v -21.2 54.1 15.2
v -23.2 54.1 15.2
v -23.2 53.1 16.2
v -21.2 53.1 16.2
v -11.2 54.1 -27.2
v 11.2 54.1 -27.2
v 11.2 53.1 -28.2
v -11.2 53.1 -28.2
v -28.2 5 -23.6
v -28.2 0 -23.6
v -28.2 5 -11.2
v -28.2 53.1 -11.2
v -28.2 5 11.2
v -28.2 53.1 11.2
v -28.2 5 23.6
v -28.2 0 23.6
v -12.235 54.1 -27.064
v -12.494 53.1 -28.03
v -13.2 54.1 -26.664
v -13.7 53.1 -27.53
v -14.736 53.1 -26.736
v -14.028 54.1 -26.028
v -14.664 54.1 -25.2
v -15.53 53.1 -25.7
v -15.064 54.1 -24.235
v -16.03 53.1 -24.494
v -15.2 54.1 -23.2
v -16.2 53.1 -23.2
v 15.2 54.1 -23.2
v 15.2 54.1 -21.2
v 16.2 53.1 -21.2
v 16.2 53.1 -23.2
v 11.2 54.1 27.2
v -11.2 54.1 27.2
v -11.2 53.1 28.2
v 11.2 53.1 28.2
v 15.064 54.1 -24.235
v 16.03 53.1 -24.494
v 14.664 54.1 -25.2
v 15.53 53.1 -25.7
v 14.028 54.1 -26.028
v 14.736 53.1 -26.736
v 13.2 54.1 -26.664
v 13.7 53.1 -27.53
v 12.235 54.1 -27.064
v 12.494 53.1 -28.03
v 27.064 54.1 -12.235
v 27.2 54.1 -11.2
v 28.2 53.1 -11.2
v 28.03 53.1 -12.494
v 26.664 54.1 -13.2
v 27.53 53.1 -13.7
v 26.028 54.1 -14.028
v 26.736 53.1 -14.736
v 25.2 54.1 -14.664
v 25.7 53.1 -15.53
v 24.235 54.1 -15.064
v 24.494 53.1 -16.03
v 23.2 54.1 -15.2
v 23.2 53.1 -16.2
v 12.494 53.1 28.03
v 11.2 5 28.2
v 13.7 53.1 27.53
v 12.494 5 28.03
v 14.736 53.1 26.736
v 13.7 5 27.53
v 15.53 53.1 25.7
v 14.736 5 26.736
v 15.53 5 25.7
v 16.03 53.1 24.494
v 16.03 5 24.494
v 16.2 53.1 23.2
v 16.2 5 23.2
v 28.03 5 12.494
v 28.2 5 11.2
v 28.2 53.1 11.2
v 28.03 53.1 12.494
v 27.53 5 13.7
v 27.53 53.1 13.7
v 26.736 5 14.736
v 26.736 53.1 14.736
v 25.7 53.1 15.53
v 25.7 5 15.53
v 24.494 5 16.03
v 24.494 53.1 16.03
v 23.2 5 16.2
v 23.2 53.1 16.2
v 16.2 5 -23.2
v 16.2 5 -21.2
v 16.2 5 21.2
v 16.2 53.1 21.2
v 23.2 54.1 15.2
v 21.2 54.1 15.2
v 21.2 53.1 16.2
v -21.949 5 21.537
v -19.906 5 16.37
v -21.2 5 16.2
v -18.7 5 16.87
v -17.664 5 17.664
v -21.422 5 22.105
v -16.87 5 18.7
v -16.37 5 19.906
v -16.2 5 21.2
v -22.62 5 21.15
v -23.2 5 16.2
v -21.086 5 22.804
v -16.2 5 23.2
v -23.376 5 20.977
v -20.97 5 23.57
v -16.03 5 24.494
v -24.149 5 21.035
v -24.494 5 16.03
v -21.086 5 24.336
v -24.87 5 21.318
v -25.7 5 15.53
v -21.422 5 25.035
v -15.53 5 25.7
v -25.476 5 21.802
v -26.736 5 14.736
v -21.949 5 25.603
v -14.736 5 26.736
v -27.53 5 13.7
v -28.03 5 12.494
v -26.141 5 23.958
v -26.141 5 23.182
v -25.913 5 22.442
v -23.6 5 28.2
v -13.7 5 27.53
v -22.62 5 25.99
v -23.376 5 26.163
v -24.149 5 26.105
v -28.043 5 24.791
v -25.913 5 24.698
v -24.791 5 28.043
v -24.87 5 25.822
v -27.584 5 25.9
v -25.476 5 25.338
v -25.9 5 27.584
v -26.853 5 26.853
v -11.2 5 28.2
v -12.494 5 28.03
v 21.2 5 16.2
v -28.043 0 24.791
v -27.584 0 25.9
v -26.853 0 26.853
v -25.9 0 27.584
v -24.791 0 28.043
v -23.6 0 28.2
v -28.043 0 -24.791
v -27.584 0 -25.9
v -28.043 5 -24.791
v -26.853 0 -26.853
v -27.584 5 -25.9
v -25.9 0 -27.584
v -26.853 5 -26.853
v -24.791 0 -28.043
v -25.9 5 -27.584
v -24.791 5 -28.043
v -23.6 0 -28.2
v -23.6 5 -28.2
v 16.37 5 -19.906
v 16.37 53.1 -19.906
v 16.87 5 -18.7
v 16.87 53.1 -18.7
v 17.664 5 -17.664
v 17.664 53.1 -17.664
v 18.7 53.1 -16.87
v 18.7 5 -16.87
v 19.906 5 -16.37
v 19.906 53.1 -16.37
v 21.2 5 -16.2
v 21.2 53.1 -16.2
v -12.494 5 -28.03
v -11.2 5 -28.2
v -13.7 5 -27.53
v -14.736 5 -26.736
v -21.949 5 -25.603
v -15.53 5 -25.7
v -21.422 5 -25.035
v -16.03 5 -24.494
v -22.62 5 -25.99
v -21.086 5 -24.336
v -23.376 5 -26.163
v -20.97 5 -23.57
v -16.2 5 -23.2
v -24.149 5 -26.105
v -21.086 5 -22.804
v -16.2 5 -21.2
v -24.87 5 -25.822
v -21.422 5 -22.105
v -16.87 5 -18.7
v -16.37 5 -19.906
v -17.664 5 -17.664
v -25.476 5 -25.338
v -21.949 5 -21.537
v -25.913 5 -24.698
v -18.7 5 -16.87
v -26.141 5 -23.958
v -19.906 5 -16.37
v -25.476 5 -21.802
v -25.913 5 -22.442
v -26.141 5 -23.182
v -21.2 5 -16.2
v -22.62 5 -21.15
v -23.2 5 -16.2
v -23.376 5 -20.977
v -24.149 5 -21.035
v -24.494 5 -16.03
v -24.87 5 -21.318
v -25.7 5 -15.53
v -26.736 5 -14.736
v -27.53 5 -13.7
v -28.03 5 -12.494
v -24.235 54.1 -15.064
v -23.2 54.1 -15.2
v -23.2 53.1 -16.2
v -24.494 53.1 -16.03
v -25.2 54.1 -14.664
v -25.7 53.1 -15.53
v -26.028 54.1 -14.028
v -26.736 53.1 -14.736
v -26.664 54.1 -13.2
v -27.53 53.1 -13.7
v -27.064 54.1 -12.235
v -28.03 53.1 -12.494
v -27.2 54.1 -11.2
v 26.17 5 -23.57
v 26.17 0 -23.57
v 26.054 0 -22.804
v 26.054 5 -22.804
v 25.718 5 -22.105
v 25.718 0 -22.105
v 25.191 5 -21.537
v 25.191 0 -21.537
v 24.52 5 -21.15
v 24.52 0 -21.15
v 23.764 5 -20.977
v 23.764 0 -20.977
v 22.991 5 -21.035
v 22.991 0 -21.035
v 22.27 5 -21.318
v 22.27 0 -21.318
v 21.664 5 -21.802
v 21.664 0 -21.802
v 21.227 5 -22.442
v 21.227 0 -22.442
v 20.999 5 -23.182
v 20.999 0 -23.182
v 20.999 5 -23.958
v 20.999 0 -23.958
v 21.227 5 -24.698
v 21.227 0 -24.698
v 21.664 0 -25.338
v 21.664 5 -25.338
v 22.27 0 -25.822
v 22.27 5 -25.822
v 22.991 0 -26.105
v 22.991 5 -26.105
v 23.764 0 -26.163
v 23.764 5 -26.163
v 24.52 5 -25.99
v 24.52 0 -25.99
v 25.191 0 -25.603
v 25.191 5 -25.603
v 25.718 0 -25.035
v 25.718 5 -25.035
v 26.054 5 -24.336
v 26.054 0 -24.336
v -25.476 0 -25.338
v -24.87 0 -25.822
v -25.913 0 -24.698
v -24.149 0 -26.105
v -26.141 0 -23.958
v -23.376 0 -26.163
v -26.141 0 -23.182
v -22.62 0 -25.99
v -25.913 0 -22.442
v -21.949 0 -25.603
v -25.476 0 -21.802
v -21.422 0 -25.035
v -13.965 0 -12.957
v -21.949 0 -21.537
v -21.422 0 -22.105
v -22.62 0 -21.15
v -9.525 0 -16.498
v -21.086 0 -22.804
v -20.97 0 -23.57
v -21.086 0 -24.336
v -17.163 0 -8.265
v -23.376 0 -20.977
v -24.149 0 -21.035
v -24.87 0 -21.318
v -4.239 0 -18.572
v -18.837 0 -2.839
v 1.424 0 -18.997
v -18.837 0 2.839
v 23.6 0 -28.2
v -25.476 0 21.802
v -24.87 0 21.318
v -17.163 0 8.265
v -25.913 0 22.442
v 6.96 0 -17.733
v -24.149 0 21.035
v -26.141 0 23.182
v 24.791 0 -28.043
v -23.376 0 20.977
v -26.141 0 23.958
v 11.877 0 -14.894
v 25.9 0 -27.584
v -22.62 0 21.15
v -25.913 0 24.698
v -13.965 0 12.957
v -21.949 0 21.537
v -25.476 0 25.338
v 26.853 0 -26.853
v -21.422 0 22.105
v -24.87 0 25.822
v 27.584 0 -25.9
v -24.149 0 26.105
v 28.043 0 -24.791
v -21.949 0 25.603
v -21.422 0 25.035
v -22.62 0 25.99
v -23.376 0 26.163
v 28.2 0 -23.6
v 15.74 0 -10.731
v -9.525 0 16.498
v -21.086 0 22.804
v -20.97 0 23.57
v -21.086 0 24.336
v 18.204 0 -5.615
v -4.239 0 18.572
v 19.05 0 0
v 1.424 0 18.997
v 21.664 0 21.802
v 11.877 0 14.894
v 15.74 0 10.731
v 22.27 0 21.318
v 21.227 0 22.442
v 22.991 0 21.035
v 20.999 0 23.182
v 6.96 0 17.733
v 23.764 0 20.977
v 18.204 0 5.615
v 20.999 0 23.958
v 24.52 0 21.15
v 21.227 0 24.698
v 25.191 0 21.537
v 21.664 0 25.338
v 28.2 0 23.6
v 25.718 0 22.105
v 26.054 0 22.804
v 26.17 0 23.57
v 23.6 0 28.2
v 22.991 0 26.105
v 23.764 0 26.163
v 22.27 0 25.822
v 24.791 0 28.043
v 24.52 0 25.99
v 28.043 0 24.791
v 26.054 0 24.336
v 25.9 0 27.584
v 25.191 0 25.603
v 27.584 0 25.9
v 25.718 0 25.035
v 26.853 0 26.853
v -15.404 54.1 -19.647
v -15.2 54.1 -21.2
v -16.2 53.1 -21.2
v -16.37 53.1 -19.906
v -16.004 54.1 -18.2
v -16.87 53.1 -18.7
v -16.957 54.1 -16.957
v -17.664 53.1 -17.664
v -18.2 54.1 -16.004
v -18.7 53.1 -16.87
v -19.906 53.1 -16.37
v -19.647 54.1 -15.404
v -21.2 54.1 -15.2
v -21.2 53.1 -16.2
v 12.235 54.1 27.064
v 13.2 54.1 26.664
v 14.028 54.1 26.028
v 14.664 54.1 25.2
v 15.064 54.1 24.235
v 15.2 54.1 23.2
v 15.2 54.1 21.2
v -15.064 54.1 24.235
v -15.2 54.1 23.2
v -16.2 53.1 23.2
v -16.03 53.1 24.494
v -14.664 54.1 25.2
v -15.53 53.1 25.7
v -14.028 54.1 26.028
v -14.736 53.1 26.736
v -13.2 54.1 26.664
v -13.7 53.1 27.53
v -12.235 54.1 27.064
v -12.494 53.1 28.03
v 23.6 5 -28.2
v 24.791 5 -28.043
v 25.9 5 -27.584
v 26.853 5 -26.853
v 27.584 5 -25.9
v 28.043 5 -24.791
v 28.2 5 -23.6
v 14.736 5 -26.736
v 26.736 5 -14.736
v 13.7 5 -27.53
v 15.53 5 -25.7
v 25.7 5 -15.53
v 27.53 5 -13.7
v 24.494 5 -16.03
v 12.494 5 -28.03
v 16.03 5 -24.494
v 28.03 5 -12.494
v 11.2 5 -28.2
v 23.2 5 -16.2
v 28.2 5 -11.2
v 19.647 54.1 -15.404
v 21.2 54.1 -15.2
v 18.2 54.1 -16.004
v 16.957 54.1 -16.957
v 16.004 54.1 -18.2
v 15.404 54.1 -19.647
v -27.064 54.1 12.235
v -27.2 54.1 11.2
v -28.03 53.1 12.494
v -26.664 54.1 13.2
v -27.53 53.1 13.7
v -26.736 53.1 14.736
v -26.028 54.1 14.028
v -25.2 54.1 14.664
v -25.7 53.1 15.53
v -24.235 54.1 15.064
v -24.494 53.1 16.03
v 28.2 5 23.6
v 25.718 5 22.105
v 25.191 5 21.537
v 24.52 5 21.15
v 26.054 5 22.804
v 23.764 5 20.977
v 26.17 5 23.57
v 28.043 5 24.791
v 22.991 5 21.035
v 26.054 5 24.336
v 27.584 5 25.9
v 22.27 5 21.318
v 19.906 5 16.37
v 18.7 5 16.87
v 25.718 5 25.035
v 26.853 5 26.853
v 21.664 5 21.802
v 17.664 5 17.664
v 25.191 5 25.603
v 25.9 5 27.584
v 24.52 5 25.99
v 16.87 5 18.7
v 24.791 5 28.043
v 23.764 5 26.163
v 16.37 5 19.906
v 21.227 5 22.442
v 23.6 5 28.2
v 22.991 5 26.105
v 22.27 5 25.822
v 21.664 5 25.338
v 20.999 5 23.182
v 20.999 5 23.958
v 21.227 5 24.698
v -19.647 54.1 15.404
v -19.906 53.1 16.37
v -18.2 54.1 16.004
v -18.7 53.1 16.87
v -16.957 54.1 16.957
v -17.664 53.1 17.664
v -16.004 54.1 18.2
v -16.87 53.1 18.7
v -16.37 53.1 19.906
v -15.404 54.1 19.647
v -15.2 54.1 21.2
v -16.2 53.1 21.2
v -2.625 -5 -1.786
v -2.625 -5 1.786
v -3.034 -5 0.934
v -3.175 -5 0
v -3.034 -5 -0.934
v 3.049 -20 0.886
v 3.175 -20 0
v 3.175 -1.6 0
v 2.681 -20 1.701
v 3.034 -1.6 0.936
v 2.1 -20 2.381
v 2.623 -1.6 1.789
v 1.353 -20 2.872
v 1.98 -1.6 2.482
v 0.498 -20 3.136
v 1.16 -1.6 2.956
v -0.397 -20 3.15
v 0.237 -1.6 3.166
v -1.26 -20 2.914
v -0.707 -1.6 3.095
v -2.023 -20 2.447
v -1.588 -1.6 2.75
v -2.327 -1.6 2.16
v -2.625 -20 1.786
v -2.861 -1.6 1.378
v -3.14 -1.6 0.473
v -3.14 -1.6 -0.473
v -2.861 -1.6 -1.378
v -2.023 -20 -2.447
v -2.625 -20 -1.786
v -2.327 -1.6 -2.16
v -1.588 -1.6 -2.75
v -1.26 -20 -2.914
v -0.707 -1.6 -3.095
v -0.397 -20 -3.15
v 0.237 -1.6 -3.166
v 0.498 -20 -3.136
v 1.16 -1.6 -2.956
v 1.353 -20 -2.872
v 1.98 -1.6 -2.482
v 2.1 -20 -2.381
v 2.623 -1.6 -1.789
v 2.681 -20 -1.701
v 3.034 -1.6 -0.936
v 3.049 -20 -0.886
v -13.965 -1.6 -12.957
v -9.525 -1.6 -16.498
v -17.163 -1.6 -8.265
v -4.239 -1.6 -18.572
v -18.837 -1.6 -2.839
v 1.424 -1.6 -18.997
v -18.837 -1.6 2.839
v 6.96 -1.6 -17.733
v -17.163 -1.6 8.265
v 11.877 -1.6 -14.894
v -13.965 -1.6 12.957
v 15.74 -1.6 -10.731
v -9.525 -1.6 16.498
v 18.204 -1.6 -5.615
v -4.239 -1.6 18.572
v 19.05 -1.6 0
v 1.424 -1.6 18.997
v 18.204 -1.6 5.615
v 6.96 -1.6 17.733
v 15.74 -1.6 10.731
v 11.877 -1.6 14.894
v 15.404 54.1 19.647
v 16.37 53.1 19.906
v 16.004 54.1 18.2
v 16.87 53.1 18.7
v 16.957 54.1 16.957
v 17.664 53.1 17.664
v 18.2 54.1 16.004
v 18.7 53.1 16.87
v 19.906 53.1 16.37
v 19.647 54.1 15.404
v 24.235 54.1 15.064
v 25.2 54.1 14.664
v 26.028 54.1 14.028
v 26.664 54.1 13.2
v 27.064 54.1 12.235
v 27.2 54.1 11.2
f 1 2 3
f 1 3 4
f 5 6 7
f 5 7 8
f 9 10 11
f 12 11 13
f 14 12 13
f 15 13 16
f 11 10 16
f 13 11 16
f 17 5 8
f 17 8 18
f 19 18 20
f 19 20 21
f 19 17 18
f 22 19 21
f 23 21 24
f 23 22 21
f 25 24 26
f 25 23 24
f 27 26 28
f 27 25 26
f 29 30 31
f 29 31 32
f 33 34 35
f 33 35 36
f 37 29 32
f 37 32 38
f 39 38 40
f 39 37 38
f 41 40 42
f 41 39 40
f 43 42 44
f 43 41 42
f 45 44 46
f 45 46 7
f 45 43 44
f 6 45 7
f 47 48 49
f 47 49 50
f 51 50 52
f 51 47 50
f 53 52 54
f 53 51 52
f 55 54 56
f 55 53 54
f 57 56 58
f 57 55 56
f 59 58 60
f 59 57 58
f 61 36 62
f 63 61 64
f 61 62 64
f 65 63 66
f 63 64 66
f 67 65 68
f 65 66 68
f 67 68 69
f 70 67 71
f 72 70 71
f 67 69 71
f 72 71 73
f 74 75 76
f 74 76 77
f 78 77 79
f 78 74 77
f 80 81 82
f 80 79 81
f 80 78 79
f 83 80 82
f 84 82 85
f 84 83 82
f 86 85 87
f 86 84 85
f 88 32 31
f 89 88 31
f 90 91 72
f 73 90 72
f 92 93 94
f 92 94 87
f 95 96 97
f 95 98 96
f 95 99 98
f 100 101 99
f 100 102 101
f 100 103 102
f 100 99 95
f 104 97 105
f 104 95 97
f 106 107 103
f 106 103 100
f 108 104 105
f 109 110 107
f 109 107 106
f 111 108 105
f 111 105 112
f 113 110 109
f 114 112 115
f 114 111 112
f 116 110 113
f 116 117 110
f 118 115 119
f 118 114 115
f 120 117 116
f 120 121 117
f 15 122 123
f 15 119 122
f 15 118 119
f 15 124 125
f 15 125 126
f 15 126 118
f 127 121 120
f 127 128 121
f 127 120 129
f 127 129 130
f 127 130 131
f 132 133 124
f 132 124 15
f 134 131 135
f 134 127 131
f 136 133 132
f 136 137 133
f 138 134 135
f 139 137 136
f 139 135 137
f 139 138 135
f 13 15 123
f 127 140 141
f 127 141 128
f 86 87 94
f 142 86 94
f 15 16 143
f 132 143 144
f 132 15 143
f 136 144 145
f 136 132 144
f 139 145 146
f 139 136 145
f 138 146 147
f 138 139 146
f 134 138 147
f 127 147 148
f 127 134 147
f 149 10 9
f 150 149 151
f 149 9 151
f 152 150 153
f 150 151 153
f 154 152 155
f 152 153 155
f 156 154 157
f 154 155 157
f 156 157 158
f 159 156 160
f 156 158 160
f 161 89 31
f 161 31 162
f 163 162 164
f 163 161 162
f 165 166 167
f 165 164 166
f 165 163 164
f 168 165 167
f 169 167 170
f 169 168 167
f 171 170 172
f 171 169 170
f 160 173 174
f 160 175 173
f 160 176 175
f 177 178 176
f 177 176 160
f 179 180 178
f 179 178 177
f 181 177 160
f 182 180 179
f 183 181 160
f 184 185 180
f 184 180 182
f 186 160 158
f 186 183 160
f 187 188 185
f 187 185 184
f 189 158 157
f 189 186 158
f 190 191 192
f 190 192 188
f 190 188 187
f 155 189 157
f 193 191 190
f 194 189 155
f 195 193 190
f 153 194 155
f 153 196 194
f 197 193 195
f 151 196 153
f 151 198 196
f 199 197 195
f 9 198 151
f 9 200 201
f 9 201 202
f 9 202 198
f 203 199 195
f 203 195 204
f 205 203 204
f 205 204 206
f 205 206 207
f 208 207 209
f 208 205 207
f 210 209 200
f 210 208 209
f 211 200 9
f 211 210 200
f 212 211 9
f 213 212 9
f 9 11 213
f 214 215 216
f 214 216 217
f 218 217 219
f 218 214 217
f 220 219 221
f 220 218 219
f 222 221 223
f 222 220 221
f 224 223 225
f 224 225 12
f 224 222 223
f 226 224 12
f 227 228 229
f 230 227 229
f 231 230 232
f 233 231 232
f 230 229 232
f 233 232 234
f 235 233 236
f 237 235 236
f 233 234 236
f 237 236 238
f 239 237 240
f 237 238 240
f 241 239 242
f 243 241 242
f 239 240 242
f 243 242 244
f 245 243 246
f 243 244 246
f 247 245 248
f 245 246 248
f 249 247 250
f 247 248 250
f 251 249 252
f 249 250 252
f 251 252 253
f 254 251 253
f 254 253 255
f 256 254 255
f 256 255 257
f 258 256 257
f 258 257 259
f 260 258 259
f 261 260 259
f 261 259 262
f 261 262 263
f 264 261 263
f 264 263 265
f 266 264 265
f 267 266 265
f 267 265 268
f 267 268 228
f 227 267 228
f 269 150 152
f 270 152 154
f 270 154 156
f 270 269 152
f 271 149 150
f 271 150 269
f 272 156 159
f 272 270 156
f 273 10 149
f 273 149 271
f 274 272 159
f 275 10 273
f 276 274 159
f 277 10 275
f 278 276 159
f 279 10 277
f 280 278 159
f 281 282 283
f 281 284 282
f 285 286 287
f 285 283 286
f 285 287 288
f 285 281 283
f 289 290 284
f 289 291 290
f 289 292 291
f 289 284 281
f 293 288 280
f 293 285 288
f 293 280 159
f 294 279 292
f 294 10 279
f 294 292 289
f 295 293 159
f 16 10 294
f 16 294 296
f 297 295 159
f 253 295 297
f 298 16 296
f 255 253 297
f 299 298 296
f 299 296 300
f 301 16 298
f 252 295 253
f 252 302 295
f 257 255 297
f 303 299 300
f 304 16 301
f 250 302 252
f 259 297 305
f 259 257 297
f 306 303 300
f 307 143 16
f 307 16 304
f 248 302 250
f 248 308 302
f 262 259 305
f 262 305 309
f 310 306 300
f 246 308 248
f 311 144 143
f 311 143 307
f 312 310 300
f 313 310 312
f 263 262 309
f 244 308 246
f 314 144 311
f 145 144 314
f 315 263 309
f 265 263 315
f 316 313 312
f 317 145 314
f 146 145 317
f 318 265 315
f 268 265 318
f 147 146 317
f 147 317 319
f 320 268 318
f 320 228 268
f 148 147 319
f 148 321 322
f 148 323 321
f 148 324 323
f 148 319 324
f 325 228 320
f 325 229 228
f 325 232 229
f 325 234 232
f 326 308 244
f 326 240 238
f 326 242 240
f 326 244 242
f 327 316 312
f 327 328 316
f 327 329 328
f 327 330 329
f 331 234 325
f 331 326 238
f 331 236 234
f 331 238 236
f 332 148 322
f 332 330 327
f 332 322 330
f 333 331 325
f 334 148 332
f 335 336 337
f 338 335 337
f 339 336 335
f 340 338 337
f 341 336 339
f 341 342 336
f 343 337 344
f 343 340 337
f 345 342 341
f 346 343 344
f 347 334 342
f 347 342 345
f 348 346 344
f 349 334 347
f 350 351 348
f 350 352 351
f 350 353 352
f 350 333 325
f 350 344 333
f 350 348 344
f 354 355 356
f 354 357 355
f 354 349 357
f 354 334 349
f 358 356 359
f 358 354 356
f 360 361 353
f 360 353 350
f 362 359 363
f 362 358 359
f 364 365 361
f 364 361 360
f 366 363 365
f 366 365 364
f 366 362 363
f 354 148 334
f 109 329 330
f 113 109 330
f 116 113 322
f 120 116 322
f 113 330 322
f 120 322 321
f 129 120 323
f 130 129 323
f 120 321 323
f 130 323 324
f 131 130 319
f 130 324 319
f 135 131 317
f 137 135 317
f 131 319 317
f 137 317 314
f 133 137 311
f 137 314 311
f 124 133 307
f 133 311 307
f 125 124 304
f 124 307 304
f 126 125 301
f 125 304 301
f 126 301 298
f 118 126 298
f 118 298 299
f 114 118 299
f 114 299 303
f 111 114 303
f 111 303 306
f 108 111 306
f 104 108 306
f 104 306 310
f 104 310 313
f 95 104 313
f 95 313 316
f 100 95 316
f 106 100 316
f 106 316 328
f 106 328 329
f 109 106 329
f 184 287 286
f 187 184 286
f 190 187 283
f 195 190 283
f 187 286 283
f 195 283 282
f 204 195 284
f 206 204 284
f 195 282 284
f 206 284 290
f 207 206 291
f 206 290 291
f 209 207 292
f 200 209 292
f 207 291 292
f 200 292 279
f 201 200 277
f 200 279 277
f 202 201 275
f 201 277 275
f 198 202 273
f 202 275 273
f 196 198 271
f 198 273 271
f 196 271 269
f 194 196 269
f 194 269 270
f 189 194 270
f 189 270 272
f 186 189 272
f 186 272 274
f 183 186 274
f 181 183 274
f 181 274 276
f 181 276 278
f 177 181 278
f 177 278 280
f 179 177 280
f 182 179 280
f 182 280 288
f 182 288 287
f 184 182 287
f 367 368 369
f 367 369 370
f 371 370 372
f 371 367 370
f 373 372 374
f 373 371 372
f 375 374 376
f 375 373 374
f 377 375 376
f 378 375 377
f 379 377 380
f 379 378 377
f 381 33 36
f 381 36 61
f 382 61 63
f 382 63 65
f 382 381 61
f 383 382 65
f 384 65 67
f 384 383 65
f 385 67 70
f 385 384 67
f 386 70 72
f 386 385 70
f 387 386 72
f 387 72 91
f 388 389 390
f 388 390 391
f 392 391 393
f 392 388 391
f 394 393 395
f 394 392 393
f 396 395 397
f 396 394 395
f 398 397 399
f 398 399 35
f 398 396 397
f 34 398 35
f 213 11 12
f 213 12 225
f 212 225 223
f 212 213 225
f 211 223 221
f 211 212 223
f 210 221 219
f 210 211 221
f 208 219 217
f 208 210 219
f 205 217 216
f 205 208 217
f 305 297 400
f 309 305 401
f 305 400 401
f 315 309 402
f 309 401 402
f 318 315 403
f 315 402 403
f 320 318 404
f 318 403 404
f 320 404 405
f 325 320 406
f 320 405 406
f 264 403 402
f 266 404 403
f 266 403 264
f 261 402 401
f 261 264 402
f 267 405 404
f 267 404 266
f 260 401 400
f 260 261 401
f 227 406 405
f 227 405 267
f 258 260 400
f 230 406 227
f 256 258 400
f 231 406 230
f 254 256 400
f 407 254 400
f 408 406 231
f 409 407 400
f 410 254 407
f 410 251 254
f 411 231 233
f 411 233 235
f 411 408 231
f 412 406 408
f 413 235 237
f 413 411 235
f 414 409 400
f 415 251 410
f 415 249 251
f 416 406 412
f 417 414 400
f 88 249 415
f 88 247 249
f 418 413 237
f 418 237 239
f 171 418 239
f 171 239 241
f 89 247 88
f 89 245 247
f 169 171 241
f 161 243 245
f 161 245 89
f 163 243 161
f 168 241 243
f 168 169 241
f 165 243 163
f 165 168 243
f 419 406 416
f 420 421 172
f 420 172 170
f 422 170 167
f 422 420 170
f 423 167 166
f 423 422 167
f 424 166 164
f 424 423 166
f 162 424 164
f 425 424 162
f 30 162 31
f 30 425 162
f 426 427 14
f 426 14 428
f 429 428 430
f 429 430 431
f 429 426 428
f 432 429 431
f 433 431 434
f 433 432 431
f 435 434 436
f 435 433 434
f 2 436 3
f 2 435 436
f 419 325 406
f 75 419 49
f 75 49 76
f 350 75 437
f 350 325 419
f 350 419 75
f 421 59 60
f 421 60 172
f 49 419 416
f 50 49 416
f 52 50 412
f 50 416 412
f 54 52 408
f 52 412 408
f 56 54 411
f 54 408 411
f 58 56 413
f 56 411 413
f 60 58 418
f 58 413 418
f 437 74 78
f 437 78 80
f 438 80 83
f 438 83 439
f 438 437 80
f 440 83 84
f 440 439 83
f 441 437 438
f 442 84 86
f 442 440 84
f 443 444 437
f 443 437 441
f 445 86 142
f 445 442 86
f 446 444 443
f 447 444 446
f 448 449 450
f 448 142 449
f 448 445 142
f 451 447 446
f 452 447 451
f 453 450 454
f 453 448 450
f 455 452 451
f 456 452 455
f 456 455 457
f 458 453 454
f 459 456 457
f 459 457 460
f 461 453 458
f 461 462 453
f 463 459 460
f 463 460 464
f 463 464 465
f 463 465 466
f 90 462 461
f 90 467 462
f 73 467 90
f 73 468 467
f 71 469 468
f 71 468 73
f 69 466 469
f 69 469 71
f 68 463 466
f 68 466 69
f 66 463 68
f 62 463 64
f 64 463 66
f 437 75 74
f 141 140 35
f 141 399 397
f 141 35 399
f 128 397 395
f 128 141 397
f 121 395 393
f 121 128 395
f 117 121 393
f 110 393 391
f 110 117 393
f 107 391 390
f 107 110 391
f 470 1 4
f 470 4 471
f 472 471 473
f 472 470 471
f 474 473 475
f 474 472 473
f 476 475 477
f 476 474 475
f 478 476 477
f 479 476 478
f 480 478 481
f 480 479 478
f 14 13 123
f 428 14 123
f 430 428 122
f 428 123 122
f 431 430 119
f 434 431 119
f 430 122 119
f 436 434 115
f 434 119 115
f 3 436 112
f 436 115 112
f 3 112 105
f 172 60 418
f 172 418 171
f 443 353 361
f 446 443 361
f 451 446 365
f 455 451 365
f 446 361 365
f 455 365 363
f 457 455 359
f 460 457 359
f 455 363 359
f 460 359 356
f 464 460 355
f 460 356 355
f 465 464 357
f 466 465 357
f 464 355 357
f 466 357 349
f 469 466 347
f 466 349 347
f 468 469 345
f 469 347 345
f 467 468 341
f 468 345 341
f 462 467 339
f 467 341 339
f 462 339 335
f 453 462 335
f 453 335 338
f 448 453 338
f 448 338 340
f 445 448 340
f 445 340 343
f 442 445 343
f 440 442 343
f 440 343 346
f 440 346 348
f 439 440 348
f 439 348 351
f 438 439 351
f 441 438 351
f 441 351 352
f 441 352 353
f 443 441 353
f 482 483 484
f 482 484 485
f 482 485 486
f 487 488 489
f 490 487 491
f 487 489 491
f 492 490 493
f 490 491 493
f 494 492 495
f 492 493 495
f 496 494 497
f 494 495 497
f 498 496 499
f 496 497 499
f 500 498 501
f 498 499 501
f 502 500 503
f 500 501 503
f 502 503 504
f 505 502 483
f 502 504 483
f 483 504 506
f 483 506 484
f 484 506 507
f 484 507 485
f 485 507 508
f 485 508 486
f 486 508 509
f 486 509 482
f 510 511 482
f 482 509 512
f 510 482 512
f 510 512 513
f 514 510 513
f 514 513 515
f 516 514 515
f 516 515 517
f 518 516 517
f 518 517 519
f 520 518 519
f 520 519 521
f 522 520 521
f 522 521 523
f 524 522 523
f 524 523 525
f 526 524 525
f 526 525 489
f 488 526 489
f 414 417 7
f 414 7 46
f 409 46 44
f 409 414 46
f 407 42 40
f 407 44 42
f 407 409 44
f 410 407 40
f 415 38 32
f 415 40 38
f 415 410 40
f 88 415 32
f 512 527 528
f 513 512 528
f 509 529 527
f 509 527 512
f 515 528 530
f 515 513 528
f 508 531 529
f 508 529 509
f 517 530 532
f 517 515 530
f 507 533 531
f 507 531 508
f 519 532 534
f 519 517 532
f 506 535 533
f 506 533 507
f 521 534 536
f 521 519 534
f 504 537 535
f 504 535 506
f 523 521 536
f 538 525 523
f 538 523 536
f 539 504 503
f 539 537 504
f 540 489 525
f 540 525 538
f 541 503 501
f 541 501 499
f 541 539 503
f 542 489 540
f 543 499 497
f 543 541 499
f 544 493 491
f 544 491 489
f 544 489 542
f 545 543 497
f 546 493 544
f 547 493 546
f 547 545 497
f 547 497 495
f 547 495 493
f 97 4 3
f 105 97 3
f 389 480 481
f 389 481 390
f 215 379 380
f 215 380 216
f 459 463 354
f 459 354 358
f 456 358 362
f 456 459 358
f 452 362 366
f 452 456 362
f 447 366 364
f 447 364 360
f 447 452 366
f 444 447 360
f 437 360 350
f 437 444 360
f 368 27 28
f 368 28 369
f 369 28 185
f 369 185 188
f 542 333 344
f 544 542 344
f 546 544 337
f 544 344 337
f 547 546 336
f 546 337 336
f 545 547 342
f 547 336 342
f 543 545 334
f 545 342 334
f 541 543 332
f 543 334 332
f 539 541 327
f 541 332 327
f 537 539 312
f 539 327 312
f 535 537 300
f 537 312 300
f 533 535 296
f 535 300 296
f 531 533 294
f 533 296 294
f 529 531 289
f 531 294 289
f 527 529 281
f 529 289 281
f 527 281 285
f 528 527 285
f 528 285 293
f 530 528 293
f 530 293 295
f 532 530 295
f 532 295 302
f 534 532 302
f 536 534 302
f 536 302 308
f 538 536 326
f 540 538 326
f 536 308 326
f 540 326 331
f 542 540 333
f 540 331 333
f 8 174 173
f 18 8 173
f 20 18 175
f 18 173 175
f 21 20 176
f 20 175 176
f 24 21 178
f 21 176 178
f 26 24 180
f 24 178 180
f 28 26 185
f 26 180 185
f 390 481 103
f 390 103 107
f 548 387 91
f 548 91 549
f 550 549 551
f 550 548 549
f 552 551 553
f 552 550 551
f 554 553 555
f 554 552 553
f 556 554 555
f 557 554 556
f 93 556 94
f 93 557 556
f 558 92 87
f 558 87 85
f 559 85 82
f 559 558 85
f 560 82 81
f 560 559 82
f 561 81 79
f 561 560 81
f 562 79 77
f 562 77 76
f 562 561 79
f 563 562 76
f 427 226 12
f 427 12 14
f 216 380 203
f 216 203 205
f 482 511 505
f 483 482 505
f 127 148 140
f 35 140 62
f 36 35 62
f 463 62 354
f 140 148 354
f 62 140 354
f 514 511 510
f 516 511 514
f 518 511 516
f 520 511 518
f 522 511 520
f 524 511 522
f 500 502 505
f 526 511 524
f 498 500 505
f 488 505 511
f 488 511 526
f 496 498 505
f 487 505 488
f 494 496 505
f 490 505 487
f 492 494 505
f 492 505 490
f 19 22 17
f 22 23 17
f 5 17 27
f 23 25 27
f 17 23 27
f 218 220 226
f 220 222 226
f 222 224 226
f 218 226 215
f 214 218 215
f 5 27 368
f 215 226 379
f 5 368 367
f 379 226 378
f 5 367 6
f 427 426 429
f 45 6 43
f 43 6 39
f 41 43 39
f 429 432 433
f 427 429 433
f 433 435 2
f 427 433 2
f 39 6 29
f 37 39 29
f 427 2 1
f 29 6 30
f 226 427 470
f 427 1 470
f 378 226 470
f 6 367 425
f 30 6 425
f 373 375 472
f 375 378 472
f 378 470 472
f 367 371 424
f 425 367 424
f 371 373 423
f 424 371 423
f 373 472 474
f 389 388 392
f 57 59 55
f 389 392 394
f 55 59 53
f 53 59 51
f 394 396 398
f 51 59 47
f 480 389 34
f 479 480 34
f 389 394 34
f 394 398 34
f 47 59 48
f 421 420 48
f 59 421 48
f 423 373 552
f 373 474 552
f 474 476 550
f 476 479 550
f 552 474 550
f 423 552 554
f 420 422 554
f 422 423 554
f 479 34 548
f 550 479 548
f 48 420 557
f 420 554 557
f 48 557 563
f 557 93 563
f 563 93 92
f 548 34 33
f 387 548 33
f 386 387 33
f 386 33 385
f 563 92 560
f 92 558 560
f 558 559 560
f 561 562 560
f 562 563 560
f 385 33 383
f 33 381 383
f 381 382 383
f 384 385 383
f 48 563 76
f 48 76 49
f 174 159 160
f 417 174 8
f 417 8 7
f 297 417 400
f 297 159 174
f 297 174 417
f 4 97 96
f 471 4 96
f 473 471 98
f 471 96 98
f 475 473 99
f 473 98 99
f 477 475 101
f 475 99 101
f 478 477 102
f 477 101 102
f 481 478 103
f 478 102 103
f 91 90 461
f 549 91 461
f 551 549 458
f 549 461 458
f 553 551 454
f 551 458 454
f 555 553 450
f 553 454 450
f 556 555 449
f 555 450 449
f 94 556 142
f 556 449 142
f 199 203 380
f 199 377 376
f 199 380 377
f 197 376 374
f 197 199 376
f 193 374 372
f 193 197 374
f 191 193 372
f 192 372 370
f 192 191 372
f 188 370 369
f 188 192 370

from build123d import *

# Parameters (mm, degrees)
F0_W      = 56.4
F0_H      = 56.4
F1_DEPTH  = 54.1
F2_R      = 19.05
F3_DEPTH  = 1.6
F4_R      = 3.175
F5_DEPTH  = 20
F6_R      = 2.6
F7_DEPTH  = 54.101
F9_DEPTH  = 15
F10_R     = 4.6
F11_W     = 12
F11_H     = 12
F12_DEPTH = 49.1
F13_R     = 5
F14_SIZE  = 1


with BuildPart() as f1:
    # F0 (on Front) → F1 (new body)
    with BuildSketch(Plane.XZ):
        Rectangle(F0_W, F0_H)
    extrude(amount=-F1_DEPTH)

    # F2 (on face) → F3 (join)
    with BuildSketch(Plane.XZ):
        Circle(F2_R)
    extrude(amount=F3_DEPTH)

    # F4 (on face) → F5 (join)
    with BuildSketch(Plane.XZ):
        Circle(F4_R)
    extrude(amount=F5_DEPTH)

    # F6 (on face) → F7 (cut, through all)
    with BuildSketch(Plane.XZ):
        with Locations((23.57, 23.57)):
            Circle(F6_R)
        with Locations((-23.57, 23.57)):
            Circle(F6_R)
        with Locations((23.57, -23.57)):
            Circle(F6_R)
        with Locations((-23.57, -23.57)):
            Circle(F6_R)
    extrude(amount=-F7_DEPTH, mode=Mode.SUBTRACT)

    # F8 (on face) → F9 (cut)
    with BuildSketch(Plane.XZ.offset(20)):
        with BuildLine():
            Line((-2.625, -1.7860571099), (-2.625, 1.7860571099))
            ThreePointArc((-2.625, 1.7860571099), (-3.175, 0), (-2.625, -1.7860571099))
        make_face()
    extrude(amount=-F9_DEPTH, mode=Mode.SUBTRACT)

    # F10
    f10_edges = [f1.edges().sort_by_distance(p)[0] for p in [
        (-28.2, 27.05, 28.2),
        (-28.2, 27.05, -28.2),
        (28.2, 27.05, 28.2),
        (28.2, 27.05, -28.2),
    ]]
    fillet(f10_edges, radius=F10_R)

    # F11 (on face) → F12 (cut)
    with BuildSketch(Plane(origin=(0, 54.1, 0), x_dir=(-1, 0, 0), z_dir=(0, 1, 0))):
        with Locations((22.2, 22.2)):
            Rectangle(F11_W, F11_H)
        with Locations((-22.2, 22.2)):
            Rectangle(F11_W, F11_H)
        with Locations((22.2, -22.2)):
            Rectangle(F11_W, F11_H)
        with Locations((-22.2, -22.2)):
            Rectangle(F11_W, F11_H)
    extrude(amount=-F12_DEPTH, mode=Mode.SUBTRACT)

    # F13
    f13_edges = [f1.edges().sort_by_distance(p)[0] for p in [
        (-16.2, 29.55, 28.2),
        (-16.2, 29.55, 16.2),
        (-28.2, 29.55, 16.2),
        (16.2, 29.55, 28.2),
        (16.2, 29.55, 16.2),
        (28.2, 29.55, 16.2),
        (28.2, 29.55, -16.2),
        (16.2, 29.55, -16.2),
        (16.2, 29.55, -28.2),
        (-16.2, 29.55, -28.2),
        (-16.2, 29.55, -16.2),
        (-28.2, 29.55, -16.2),
    ]]
    fillet(f13_edges, radius=F13_R)

    # F14
    f14_edges = [f1.edges().sort_by_distance(p)[0] for p in [
        (0, 54.1, 28.2),
    ]]
    chamfer(f14_edges, length=F14_SIZE)


solid = f1.part
